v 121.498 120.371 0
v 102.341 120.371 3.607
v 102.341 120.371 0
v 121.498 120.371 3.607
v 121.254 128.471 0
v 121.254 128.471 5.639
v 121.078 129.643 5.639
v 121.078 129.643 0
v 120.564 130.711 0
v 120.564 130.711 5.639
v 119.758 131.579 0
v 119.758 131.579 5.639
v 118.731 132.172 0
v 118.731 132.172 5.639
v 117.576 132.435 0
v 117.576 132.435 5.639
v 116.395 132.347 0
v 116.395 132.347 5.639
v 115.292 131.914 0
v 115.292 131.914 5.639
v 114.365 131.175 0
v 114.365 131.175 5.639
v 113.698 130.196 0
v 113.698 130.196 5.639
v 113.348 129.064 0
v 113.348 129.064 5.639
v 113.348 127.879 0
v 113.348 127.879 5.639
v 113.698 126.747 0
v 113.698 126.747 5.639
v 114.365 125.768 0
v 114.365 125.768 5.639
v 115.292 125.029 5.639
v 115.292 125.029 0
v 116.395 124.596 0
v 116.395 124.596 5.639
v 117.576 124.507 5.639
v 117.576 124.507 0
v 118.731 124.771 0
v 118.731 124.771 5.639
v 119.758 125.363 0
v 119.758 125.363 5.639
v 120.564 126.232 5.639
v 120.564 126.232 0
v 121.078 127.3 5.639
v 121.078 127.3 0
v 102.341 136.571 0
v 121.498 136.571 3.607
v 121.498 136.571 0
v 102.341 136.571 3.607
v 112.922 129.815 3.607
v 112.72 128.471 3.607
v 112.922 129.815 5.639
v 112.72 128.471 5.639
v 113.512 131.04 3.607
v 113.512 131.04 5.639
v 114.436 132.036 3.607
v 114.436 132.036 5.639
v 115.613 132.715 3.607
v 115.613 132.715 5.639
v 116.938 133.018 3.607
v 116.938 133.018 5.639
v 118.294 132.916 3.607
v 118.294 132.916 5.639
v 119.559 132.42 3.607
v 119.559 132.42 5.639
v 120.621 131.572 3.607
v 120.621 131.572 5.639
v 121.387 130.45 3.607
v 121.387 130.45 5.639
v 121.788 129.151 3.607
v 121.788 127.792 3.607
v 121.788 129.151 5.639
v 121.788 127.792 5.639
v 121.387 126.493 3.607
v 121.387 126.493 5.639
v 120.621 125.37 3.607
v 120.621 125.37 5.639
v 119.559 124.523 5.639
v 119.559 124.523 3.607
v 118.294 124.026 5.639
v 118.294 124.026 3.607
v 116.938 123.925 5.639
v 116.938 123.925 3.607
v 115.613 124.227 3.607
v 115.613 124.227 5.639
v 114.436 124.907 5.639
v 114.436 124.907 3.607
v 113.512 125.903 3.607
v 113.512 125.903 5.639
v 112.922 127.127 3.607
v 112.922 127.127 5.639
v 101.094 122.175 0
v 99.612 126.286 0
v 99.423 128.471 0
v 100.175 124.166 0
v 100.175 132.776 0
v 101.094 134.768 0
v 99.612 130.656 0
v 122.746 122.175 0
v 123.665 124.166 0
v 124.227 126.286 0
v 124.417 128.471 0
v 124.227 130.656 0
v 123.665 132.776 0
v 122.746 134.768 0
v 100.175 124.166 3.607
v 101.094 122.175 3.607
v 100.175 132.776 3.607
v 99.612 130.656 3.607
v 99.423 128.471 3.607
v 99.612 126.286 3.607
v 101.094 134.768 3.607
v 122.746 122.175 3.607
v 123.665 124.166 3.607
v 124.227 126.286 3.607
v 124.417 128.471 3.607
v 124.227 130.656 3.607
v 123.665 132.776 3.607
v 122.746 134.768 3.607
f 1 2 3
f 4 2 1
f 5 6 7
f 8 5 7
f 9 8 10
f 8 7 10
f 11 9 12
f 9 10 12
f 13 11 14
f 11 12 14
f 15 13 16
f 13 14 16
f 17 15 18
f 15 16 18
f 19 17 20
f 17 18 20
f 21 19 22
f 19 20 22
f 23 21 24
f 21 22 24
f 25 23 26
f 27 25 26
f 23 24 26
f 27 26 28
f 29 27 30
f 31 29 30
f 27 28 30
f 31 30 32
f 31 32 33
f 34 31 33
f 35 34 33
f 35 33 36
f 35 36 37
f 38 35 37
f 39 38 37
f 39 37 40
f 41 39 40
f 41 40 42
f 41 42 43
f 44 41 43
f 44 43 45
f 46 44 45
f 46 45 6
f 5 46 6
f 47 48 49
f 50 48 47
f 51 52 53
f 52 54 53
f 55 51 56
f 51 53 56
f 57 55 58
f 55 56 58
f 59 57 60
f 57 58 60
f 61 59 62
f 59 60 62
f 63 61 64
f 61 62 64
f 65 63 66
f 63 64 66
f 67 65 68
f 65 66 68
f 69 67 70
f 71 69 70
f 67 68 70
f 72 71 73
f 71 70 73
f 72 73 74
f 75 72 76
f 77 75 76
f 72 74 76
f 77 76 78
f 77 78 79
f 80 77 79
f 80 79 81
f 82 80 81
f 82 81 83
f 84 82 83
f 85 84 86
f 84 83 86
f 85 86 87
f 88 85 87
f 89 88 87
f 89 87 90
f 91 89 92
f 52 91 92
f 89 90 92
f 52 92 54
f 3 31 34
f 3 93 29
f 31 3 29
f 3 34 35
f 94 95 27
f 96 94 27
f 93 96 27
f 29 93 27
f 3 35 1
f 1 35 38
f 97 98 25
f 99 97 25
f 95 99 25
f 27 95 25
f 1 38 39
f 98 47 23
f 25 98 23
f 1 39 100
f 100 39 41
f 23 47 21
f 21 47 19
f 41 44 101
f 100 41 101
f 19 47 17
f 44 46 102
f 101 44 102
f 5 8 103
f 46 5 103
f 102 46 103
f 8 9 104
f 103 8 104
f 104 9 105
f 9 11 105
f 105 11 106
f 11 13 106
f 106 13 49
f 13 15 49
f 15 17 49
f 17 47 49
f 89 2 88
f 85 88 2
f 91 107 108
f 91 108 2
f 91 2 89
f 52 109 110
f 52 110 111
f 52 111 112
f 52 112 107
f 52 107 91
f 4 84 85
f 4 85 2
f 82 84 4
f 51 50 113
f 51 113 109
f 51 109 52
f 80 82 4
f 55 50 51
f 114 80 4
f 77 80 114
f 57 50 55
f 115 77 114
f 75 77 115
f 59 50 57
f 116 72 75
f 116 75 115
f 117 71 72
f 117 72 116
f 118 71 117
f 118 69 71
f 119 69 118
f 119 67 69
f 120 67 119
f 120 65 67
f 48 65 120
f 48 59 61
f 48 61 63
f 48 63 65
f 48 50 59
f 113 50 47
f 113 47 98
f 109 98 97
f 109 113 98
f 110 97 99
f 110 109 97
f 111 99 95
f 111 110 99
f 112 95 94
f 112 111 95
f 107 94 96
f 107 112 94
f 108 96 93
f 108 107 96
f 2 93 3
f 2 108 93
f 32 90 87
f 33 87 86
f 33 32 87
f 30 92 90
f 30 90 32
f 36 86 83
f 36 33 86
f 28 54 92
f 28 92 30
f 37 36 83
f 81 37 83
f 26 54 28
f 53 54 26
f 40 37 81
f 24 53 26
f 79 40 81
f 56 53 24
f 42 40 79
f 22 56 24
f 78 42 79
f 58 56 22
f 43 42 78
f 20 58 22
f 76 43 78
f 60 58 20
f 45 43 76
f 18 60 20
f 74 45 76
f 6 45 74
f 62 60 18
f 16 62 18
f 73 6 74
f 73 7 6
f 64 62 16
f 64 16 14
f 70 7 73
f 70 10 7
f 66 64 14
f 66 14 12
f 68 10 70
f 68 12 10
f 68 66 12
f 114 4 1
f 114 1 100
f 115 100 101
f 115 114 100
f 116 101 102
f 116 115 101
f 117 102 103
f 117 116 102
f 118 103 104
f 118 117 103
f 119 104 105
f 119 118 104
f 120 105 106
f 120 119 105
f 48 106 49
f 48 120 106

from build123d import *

# Parameters (mm, degrees)
BOSS_EXTRUDE1_DEPTH  = 3.6068
SKETCH2_W            = 4.5593
SKETCH2_H            = 2.032
M7_CLEARANCE_HOLE1_D = 7.9502


with BuildPart() as part:
    # Sketch1 → Boss-Extrude1 (new body)
    with BuildSketch(Plane.XY.offset(3.6068)):
        with BuildLine():
            Line((102.341394541, 120.371267572), (121.498125987, 120.371267572))
            ThreePointArc((121.498125987, 120.371267572), (124.416560264, 128.471327572), (121.498125987, 136.571387572))
            Line((121.498125987, 136.571387572), (102.341394541, 136.571387572))
            ThreePointArc((102.341394541, 136.571387572), (99.422960264, 128.471327572), (102.341394541, 120.371267572))
        make_face()
    extrude(amount=-BOSS_EXTRUDE1_DEPTH)

    # Sketch2 → Revolve1 (revolve)
    with BuildSketch(Plane.XZ.offset(-128.471327572), mode=Mode.PRIVATE) as revolve1_sk:
        with Locations((119.558810264, 4.6228)):
            Rectangle(SKETCH2_W, SKETCH2_H)
    revolve(revolve1_sk.sketch.rotate(Axis((117.279160264, 128.471327572, 5.6388), (0, 0, -1)), 180), axis=Axis((117.279160264, 128.471327572, 5.6388), (0, 0, -1)))

    # M7 Clearance Hole1 (through all)
    with Locations(Plane(origin=(0, 0, 0), x_dir=(-1, 0, 0), z_dir=(0, 0, -1))):
        with Locations((-117.279160264, 128.471327572)):
            Hole(M7_CLEARANCE_HOLE1_D / 2)


solid = part.part
